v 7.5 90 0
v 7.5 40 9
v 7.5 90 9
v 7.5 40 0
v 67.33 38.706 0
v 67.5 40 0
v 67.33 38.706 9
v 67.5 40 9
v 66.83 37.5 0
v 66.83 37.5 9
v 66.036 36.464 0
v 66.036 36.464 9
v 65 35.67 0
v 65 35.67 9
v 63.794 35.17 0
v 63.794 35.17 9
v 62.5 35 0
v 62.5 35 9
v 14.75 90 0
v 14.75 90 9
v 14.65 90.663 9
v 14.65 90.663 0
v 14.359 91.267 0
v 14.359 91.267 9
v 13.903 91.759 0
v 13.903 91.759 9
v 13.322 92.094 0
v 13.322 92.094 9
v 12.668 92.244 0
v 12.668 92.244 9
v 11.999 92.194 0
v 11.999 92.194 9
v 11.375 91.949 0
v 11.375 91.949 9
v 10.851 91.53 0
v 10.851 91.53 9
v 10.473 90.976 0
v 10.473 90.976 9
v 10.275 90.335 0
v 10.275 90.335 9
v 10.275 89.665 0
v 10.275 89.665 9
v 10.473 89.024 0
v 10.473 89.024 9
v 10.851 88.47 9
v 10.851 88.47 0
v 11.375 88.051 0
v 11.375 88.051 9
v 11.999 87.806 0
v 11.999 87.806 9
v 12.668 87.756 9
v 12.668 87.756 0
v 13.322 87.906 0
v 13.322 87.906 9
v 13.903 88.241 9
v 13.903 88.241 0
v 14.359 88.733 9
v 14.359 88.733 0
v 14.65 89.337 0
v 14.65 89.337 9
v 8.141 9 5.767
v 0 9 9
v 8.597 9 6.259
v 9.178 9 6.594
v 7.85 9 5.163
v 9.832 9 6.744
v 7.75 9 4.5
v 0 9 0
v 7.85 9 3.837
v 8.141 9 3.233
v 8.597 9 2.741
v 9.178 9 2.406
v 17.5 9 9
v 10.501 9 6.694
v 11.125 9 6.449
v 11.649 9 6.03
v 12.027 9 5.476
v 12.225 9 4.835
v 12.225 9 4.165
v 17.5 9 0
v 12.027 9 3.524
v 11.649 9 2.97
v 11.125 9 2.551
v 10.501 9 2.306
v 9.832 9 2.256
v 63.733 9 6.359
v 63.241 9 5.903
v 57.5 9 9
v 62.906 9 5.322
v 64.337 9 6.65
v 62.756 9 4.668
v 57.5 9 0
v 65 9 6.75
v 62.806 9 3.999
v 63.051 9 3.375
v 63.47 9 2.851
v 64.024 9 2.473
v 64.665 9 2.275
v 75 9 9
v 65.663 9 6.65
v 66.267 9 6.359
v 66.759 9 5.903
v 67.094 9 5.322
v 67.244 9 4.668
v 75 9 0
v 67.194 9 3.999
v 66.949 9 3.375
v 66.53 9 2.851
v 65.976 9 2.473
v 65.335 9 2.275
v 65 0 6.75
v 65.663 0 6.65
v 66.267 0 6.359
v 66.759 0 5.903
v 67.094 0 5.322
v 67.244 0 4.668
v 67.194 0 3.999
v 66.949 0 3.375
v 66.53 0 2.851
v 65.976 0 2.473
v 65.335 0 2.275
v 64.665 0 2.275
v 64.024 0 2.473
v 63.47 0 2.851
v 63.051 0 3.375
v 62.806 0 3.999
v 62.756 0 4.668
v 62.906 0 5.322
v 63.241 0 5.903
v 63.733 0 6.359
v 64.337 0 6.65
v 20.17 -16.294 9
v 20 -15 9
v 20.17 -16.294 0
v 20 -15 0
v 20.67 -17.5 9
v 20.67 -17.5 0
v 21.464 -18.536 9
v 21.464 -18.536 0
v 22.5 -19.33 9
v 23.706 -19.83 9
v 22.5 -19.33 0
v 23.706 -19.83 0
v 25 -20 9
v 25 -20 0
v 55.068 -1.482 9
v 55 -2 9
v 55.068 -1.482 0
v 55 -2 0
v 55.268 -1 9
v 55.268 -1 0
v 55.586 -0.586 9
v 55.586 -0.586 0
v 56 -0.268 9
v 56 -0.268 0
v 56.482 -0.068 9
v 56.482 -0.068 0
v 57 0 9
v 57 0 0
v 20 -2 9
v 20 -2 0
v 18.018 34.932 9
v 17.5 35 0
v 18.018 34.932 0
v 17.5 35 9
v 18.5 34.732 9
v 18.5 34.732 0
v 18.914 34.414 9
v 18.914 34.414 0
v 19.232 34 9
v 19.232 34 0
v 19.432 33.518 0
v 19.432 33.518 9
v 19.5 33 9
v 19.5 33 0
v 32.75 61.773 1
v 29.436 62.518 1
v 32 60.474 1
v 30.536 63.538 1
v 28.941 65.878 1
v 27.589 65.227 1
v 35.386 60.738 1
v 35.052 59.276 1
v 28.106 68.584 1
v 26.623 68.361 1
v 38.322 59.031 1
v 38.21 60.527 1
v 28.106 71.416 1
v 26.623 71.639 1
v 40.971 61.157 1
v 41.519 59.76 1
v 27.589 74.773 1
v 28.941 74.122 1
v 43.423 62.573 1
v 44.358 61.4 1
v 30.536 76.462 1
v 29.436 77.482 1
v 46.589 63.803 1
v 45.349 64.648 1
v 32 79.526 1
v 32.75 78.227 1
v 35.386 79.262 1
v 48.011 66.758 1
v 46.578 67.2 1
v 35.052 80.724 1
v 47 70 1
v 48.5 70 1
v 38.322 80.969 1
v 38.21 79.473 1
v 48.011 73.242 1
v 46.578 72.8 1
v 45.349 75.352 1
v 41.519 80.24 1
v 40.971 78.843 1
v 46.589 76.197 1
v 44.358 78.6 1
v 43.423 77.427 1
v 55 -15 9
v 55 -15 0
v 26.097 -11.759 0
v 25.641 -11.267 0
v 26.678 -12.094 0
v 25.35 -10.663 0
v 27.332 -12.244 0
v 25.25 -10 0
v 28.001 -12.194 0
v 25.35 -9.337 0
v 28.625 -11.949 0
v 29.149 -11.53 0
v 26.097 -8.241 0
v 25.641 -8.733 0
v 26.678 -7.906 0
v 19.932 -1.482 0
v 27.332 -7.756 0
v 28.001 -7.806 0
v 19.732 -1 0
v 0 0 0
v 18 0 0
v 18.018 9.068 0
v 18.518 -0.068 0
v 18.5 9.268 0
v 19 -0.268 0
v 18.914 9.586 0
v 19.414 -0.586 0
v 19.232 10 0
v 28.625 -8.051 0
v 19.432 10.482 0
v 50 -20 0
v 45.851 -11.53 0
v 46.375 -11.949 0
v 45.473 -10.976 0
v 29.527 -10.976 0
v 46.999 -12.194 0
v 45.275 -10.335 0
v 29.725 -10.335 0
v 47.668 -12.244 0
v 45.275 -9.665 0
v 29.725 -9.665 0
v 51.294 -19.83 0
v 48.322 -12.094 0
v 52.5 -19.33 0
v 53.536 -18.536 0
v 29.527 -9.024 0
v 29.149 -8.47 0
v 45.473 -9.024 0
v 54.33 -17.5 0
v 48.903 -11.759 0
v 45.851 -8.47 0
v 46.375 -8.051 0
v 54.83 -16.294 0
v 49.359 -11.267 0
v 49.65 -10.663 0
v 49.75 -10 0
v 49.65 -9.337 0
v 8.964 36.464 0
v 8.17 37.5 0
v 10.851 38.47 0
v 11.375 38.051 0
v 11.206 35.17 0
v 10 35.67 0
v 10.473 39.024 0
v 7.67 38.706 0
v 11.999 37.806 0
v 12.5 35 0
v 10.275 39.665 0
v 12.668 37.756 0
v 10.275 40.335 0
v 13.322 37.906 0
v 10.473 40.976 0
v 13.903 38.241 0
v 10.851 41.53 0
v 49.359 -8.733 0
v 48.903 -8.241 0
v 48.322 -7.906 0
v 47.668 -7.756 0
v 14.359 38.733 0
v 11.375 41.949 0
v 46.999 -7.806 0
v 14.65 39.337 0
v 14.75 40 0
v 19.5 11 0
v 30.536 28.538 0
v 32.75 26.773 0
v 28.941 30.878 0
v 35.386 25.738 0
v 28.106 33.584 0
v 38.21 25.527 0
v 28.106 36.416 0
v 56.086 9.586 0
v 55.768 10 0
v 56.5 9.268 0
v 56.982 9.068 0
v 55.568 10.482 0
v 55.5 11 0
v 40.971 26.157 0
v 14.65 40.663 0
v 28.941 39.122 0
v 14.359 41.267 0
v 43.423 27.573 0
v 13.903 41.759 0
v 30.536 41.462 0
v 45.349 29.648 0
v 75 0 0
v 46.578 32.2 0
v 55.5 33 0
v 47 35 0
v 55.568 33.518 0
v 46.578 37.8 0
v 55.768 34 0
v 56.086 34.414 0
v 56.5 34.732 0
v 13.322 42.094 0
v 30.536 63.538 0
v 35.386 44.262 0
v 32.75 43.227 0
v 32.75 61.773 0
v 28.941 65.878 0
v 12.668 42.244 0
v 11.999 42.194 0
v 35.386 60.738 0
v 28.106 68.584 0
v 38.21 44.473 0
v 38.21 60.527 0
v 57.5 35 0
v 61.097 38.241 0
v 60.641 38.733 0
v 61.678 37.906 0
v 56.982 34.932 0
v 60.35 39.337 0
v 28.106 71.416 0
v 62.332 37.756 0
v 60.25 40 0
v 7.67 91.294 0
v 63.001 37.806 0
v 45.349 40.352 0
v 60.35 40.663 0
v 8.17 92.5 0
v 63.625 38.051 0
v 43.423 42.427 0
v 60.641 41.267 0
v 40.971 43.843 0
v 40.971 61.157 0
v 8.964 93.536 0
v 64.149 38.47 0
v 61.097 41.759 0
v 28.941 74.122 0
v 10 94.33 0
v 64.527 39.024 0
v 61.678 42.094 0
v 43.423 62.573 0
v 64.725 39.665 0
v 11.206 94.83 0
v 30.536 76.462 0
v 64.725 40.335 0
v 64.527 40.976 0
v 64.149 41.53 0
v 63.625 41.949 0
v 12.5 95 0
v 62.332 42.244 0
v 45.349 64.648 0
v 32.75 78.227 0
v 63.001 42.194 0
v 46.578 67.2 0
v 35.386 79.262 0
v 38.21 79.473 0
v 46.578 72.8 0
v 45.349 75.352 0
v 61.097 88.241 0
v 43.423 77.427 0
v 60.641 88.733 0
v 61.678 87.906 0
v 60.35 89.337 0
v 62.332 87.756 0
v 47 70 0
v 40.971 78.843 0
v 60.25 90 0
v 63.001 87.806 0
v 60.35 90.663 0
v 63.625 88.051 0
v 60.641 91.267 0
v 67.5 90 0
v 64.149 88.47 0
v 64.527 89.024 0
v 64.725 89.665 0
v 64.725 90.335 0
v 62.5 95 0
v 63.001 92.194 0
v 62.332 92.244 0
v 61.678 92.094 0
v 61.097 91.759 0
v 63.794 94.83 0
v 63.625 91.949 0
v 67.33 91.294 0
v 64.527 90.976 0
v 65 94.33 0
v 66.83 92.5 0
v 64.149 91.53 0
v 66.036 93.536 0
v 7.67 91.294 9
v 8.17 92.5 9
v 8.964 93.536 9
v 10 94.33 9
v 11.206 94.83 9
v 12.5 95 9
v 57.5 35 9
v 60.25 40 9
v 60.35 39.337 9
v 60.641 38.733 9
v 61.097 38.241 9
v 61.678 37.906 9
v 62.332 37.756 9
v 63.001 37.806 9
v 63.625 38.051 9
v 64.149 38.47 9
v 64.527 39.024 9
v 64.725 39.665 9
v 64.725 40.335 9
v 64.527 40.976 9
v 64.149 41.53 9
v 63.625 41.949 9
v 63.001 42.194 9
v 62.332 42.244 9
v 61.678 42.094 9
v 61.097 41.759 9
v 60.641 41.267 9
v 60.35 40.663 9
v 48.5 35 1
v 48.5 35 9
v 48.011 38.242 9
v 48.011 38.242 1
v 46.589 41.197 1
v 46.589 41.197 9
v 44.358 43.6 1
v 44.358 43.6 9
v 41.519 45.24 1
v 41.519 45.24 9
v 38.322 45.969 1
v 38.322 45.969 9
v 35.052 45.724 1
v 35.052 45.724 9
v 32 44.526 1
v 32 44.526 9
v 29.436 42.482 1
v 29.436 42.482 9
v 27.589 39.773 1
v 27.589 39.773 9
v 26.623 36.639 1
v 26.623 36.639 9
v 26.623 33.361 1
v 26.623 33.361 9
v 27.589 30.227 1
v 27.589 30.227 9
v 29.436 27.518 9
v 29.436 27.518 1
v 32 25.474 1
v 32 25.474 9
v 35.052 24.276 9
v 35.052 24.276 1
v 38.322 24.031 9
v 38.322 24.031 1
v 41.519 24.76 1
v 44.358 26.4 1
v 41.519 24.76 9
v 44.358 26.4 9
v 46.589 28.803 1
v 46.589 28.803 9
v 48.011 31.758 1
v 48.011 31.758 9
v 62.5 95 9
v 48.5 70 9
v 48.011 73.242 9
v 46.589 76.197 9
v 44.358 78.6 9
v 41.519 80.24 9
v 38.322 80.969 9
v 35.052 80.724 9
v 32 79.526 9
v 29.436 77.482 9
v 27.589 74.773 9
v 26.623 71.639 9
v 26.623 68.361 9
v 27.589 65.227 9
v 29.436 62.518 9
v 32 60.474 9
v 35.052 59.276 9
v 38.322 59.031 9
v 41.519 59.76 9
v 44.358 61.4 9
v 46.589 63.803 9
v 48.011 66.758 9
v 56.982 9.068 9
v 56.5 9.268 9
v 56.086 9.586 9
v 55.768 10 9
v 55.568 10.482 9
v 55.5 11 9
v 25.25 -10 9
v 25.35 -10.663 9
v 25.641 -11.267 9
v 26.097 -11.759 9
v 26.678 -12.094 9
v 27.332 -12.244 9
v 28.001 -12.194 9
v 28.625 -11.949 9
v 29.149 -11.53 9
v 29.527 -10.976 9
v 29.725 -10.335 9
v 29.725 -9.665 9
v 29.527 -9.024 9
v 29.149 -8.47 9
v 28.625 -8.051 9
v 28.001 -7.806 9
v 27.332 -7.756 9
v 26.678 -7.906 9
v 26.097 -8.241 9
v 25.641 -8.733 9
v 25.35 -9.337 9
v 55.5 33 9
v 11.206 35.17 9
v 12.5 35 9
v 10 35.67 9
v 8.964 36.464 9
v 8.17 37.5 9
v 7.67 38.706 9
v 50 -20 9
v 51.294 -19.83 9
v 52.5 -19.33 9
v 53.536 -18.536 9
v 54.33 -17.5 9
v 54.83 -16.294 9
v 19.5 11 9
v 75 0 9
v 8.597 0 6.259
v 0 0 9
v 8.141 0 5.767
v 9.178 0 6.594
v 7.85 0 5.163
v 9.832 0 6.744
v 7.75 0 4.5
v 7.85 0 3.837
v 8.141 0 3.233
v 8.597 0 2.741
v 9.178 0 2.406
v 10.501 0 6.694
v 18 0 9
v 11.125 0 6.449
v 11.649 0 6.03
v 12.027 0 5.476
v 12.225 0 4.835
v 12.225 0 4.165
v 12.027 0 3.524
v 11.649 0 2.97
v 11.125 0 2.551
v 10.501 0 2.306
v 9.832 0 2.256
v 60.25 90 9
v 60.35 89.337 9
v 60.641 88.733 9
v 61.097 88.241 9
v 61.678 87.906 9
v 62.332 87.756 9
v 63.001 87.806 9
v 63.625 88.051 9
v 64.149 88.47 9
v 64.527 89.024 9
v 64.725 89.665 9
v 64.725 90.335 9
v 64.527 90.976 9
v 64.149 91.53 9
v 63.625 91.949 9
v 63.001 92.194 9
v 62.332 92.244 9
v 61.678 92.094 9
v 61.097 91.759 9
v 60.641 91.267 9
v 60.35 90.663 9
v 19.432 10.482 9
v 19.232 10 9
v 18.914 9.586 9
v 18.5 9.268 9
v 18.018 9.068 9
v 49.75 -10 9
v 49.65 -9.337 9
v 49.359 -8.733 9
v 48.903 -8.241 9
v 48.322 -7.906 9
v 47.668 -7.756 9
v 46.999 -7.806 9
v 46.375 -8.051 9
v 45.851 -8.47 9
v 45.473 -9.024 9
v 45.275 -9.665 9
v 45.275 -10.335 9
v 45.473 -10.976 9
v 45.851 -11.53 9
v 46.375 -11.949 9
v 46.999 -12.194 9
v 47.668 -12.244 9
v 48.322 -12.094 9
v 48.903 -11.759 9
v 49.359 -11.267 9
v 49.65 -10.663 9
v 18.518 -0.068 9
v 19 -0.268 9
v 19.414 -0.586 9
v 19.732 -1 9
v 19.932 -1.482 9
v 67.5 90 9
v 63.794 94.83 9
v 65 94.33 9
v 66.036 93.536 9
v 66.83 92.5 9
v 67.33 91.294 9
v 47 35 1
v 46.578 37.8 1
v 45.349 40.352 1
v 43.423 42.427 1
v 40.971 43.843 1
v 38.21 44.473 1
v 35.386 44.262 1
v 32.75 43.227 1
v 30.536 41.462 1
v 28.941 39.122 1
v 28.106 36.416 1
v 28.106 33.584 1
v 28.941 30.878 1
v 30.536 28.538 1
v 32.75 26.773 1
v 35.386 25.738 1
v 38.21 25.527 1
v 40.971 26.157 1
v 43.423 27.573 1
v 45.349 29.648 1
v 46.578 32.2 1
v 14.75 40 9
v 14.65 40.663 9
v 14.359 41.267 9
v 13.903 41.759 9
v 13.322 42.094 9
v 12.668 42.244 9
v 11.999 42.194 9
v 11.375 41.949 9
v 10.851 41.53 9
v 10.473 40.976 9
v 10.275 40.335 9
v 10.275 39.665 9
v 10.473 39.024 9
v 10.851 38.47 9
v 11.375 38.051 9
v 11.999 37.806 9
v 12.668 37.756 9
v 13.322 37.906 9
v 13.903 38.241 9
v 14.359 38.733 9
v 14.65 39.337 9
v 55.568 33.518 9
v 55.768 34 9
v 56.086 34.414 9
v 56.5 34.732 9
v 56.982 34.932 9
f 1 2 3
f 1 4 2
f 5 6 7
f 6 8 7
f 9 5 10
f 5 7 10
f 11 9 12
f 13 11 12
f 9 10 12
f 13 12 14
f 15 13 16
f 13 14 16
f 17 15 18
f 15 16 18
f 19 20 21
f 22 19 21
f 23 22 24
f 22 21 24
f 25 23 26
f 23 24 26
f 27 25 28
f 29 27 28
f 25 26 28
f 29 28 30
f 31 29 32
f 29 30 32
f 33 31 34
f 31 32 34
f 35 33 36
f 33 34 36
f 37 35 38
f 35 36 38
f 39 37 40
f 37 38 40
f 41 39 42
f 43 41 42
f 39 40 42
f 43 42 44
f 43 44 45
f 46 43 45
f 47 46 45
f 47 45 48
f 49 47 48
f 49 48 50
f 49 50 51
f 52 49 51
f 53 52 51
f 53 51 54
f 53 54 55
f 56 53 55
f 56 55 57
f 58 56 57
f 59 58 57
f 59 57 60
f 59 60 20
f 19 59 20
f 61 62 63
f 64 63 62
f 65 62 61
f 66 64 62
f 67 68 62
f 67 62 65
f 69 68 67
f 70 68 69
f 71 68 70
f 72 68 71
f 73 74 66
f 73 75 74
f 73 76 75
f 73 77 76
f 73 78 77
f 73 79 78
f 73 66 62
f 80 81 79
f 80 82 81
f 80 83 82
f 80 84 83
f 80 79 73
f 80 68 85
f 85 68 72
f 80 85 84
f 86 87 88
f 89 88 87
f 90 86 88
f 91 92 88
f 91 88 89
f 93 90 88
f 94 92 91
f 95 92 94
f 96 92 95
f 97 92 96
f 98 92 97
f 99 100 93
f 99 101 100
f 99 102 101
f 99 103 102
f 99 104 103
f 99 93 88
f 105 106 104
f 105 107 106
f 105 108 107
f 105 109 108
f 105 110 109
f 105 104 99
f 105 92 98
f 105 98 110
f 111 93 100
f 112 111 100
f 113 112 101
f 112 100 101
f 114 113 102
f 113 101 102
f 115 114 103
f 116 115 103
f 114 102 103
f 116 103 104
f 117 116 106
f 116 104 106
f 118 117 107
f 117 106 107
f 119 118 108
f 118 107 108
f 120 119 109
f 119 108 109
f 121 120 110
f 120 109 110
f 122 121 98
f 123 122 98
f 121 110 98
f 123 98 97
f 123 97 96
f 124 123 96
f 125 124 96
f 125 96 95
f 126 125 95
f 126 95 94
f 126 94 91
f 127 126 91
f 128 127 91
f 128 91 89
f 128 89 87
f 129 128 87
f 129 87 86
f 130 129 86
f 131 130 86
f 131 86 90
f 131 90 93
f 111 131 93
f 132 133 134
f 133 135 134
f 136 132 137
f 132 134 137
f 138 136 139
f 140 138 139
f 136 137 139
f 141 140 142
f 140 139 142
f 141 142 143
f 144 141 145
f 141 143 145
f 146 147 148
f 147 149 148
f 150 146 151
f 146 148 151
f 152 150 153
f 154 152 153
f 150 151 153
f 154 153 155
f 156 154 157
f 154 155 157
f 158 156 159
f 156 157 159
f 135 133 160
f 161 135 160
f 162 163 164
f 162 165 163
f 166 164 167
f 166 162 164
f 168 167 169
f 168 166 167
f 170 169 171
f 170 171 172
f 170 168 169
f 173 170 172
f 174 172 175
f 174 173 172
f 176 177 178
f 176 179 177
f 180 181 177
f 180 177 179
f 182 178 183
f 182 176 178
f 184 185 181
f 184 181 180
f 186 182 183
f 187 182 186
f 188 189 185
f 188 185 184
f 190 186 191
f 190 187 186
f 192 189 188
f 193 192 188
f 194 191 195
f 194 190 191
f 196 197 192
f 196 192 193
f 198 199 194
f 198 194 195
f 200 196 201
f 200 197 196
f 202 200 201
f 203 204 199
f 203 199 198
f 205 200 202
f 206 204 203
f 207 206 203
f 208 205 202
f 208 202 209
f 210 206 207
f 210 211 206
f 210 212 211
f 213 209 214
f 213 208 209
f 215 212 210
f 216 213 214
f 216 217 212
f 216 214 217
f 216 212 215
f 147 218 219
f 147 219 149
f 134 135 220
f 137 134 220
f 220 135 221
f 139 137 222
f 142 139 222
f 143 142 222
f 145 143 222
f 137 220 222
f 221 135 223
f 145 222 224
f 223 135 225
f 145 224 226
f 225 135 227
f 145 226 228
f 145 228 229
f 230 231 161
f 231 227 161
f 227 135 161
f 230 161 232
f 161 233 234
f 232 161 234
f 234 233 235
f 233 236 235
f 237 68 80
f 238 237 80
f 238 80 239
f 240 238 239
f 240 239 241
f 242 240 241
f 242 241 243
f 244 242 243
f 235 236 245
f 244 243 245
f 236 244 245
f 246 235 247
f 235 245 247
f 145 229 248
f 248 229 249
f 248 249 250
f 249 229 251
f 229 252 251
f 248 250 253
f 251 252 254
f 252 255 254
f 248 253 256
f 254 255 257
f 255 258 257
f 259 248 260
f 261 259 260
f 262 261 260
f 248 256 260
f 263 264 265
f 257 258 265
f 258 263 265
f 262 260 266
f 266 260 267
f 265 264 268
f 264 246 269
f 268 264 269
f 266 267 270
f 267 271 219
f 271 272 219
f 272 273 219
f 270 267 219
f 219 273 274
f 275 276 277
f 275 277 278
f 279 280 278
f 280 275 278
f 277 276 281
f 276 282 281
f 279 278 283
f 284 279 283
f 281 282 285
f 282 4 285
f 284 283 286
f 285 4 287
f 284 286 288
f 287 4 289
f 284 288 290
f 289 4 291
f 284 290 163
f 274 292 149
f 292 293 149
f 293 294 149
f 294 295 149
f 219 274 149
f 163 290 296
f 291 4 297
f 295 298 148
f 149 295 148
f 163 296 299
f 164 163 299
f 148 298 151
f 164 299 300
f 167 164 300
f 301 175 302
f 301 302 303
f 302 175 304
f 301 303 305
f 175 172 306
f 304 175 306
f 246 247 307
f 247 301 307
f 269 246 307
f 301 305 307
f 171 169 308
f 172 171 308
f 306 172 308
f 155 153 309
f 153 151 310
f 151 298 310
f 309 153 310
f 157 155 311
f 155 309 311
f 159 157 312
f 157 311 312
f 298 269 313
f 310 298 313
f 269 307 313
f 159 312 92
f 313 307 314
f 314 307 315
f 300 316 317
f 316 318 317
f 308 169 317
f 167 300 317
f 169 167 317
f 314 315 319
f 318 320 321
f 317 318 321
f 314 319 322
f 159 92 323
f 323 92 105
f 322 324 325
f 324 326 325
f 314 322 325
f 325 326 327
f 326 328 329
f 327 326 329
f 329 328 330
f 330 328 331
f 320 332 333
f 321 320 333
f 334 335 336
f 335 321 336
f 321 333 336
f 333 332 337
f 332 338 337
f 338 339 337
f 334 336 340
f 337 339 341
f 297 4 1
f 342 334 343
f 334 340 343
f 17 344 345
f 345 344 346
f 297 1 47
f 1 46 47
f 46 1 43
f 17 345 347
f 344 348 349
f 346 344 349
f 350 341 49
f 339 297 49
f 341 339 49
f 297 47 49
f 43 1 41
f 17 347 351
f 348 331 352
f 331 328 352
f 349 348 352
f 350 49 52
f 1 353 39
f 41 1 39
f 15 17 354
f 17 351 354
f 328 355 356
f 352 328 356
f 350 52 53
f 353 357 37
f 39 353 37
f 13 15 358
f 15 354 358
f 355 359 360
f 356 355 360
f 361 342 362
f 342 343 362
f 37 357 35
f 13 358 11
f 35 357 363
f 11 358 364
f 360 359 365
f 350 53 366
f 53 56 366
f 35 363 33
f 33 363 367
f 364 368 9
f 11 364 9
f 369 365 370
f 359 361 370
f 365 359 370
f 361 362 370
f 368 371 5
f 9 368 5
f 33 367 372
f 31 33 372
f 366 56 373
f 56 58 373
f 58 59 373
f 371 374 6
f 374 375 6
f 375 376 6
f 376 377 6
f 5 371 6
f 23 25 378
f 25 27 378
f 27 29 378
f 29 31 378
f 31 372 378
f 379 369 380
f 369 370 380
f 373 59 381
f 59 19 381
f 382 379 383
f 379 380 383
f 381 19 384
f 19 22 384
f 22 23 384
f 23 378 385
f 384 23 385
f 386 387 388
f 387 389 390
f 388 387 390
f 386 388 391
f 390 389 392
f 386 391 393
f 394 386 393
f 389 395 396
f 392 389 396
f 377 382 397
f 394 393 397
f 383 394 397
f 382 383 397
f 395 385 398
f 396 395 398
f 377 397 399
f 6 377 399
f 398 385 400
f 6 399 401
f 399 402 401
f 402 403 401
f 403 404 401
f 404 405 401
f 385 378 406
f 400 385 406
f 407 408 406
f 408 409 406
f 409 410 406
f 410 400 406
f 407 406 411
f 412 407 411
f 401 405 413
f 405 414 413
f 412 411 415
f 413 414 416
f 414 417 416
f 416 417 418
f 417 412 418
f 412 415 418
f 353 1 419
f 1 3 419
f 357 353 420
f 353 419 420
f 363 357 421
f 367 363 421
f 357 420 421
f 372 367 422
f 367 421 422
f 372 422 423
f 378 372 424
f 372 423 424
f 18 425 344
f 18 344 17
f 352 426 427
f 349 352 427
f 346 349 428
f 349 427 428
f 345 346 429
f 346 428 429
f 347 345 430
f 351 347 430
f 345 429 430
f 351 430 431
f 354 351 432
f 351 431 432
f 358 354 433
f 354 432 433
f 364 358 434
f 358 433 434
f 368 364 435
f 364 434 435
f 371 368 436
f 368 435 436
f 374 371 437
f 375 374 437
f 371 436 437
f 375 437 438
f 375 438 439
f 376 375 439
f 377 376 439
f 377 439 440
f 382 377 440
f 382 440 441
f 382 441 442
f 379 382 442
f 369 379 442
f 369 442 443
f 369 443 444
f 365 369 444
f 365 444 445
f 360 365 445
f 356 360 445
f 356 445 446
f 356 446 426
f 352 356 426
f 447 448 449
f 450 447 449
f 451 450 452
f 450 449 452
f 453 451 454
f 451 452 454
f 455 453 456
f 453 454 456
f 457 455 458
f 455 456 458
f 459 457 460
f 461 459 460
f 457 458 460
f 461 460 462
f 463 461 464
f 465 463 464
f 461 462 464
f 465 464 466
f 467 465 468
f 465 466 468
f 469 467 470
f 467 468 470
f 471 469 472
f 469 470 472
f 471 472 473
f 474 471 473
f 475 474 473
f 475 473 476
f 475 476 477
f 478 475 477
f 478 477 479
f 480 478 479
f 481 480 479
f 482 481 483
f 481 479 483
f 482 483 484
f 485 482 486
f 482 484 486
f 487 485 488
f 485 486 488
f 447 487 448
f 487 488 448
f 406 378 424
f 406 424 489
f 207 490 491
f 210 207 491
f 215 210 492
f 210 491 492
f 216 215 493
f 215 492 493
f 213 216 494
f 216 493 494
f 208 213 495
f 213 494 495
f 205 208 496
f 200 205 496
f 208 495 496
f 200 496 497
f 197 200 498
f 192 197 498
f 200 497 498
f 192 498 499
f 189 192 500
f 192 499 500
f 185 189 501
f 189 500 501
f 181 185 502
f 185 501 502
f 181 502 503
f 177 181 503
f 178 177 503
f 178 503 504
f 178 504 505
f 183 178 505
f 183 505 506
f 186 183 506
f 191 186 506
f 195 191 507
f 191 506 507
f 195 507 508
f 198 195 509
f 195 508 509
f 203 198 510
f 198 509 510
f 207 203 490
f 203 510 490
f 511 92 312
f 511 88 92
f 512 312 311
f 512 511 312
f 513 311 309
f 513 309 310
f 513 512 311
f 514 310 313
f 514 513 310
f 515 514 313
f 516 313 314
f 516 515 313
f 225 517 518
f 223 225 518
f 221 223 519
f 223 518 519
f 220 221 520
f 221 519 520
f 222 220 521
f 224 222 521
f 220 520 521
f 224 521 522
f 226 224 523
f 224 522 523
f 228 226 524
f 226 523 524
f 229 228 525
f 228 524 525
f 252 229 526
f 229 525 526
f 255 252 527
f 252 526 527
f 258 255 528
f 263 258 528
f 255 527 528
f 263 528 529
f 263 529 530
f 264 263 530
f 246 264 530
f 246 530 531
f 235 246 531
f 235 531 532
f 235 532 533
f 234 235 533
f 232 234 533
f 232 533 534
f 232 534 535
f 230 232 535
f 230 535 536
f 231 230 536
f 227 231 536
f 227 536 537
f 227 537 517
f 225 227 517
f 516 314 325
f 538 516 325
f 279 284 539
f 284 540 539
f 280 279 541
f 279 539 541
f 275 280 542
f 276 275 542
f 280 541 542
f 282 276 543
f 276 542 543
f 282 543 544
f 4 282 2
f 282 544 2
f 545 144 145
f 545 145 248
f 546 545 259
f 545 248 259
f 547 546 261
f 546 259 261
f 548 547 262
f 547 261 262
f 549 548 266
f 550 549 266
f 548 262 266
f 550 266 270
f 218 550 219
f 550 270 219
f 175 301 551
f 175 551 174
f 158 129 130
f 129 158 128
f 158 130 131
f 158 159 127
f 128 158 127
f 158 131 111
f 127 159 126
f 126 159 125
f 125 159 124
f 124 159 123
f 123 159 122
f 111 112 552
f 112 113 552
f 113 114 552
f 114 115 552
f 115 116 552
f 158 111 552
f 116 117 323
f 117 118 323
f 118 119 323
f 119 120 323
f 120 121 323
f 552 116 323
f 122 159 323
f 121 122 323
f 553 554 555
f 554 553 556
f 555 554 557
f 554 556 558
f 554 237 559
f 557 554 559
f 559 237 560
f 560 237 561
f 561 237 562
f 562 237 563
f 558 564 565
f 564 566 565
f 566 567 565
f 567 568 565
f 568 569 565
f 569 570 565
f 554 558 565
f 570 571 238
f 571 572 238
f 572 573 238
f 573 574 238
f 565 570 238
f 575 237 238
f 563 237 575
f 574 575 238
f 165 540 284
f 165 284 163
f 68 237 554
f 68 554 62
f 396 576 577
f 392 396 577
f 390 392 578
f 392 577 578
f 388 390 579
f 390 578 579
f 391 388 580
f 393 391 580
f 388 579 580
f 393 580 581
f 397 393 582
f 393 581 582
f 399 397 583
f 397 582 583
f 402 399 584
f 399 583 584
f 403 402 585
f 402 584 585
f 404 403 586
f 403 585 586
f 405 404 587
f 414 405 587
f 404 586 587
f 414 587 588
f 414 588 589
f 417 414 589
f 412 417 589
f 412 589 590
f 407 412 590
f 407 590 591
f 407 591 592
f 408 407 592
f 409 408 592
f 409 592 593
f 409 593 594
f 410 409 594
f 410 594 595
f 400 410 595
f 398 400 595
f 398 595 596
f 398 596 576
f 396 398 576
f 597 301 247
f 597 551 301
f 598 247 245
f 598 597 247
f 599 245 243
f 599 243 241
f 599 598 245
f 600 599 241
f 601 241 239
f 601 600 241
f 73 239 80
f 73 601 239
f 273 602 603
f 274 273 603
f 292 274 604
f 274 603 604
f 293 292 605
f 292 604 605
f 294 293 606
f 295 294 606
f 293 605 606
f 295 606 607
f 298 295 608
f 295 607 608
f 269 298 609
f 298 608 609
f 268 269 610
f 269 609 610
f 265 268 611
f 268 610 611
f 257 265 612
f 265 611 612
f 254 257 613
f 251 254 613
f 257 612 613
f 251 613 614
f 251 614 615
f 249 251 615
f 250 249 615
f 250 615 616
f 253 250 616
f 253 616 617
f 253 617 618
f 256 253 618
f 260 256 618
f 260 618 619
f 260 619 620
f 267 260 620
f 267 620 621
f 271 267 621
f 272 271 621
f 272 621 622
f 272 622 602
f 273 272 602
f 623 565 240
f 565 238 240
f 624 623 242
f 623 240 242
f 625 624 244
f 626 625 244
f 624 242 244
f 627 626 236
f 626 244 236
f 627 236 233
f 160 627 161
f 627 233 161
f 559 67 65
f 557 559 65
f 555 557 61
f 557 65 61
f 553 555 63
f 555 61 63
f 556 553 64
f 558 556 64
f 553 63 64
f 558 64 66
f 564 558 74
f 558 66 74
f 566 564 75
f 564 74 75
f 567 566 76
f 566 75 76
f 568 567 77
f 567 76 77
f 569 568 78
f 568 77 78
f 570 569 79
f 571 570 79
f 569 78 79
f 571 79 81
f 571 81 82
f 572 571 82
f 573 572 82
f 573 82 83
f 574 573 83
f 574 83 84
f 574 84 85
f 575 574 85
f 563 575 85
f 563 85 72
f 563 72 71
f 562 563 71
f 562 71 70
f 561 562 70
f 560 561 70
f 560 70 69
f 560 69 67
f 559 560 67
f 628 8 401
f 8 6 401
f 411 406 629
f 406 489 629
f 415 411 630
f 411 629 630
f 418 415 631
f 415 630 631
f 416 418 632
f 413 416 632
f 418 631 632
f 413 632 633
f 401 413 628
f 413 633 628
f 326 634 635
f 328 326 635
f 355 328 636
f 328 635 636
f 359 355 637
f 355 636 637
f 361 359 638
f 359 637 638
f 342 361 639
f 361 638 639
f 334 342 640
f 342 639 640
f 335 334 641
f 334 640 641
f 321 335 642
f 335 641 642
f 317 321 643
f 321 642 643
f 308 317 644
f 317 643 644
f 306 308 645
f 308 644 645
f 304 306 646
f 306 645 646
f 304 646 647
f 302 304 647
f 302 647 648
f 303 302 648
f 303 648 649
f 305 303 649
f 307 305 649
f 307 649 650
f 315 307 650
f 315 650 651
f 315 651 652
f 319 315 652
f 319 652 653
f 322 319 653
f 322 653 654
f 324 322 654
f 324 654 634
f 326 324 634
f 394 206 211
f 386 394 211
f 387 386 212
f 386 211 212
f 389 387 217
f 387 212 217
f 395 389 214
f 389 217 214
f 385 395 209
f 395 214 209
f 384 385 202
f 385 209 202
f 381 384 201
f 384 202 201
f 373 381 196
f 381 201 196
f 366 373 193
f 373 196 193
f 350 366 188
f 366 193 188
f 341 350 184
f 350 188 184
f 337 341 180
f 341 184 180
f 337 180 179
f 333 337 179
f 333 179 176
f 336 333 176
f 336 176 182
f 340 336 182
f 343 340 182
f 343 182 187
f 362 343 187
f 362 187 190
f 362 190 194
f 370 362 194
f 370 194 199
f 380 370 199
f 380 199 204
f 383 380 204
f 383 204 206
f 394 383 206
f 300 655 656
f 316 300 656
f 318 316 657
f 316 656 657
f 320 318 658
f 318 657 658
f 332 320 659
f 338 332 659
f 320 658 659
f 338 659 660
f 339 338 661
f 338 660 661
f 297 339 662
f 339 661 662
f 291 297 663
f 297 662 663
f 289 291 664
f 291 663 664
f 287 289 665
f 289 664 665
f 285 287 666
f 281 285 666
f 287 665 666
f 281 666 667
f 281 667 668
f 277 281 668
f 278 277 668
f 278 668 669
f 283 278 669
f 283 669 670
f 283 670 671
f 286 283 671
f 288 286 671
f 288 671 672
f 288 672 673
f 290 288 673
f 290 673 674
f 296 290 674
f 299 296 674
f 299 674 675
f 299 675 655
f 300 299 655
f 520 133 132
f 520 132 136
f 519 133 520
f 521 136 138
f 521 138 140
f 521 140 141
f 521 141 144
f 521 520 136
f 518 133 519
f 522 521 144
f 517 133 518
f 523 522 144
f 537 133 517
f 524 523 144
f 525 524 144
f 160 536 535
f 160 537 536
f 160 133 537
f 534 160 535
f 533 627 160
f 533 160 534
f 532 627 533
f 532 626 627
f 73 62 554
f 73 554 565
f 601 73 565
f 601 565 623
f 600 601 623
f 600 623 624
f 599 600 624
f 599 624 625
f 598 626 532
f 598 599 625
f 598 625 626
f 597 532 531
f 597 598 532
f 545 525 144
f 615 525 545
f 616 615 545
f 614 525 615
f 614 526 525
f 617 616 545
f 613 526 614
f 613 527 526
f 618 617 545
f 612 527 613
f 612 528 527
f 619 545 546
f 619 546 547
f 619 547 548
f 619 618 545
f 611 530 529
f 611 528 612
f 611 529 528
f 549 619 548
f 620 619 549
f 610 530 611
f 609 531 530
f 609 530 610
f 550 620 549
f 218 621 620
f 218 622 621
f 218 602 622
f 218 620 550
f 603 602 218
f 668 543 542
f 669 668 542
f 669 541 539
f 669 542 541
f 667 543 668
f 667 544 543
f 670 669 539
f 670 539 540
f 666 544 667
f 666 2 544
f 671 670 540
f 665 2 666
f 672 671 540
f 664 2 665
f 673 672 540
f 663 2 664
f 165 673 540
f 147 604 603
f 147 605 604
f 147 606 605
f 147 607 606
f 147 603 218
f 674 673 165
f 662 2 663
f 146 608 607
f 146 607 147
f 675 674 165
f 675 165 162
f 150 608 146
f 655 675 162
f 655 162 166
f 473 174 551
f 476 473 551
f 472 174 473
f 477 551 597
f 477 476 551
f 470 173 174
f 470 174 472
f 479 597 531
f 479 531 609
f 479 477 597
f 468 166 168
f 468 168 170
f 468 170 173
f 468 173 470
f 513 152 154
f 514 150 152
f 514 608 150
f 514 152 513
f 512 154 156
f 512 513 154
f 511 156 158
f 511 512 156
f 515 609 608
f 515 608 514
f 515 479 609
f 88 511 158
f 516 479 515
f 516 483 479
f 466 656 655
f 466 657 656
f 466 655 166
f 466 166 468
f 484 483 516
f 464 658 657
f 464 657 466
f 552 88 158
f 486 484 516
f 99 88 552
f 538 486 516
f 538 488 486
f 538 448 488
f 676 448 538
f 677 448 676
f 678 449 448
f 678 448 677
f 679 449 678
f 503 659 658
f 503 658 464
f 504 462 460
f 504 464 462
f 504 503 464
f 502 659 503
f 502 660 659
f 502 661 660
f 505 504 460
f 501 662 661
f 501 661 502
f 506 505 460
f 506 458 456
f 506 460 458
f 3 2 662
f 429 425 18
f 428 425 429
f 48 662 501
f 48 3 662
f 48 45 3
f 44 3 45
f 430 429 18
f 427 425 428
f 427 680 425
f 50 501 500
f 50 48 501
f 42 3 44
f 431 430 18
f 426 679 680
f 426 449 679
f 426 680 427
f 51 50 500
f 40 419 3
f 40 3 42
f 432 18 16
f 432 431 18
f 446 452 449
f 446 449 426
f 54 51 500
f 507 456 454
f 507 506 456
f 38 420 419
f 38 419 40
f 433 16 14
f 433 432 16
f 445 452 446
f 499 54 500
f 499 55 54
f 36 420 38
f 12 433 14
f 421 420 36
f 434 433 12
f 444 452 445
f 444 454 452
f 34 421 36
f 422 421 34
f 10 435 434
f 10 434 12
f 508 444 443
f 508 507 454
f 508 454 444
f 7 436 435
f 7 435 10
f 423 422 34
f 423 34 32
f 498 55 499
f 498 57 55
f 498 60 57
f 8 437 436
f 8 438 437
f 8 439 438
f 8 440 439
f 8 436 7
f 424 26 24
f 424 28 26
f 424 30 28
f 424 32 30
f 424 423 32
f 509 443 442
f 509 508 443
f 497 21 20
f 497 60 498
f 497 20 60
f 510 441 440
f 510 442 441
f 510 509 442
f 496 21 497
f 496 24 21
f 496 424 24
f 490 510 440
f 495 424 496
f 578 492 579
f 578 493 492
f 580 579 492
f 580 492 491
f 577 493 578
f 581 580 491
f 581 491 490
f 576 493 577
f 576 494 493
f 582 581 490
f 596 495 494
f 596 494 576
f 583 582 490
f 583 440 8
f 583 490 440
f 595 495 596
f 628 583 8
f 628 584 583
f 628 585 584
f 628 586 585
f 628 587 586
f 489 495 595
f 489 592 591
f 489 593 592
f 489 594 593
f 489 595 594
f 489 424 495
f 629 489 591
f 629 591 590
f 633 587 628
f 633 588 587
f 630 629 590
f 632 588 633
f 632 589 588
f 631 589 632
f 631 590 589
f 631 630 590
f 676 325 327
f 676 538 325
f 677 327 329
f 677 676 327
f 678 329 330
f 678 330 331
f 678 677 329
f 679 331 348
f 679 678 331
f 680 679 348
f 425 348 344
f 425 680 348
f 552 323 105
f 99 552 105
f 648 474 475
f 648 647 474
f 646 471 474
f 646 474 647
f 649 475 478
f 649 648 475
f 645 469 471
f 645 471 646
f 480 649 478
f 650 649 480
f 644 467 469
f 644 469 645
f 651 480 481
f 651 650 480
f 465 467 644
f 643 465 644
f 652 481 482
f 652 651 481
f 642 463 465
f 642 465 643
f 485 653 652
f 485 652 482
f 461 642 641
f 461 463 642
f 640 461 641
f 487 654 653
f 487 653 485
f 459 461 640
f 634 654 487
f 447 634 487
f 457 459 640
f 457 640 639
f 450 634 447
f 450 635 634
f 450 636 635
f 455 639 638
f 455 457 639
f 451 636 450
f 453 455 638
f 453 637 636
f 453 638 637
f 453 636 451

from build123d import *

# Parameters (mm, degrees)
ESQUISSE1_W                  = 75
ESQUISSE1_H                  = 95
BOSS_EXTRU_1_DEPTH           = 9
ESQUISSE2_W                  = 35
ESQUISSE2_H                  = 20
BOSS_EXTRU_2_DEPTH           = 9
ESQUISSE3_R                  = 11
ENL_V_MAT_EXTRU_1_DEPTH      = 8
ESQUISSE4_R                  = 9.5
ENL_V_MAT_EXTRU_2_DEPTH      = 122.371331047
ENL_V_MAT_EXTRU_3_DEPTH      = 122.371331047
ENL_V_MAT_EXTRU_3_DEPTH_BACK = 122.371331047
ESQUISSE5_W                  = 7.5
ESQUISSE5_H                  = 86
ENL_V_START                  = -9
ESQUISSE8_W                  = 12
ESQUISSE8_H                  = 26
ENL_V_MAT_EXTRU_6_DEPTH      = 9
CONG_1_R                     = 2
CONG_2_R                     = 5
ESQUISSE6_R                  = 2.25
ENL_V_MAT_EXTRU_4_DEPTH      = 122.371331047
ESQUISSE7_R                  = 2.25
ENL_V_MAT_EXTRU_5_DEPTH      = 115.46396813


with BuildPart() as part:
    # Esquisse1 → Boss.-Extru.1 (new body)
    with BuildSketch(Plane.XY):
        with Locations((37.5, 47.5)):
            Rectangle(ESQUISSE1_W, ESQUISSE1_H)
    extrude(amount=BOSS_EXTRU_1_DEPTH)

    # Esquisse2 → Boss.-Extru.2 (add)
    with BuildSketch(Plane.XY.offset(9)):
        with Locations((37.5, -10)):
            Rectangle(ESQUISSE2_W, ESQUISSE2_H)
    extrude(amount=-BOSS_EXTRU_2_DEPTH)

    # Esquisse3 → Enlèv. mat.-Extru.1 (cut)
    with BuildSketch(Plane.XY.offset(9)):
        with Locations((37.5, 70)):
            Circle(ESQUISSE3_R)
        with Locations((37.5, 35)):
            Circle(ESQUISSE3_R)
    extrude(amount=-ENL_V_MAT_EXTRU_1_DEPTH, mode=Mode.SUBTRACT)

    # Esquisse4 → Enlèv. mat.-Extru.2 (cut, through all)
    with BuildSketch(Plane.XY.offset(9)):
        with Locations((37.5, 70)):
            Circle(ESQUISSE4_R)
        with Locations((37.5, 35)):
            Circle(ESQUISSE4_R)
    extrude(amount=-ENL_V_MAT_EXTRU_2_DEPTH, mode=Mode.SUBTRACT)

    # Esquisse5 → Enlèv. mat.-Extru.3 (cut, two sides: drawn at the far end of the back side and taken through both)
    with BuildSketch(Plane.XY.offset(9).offset(-ENL_V_MAT_EXTRU_3_DEPTH_BACK)):
        with Locations((71.25, 52)):
            Rectangle(ESQUISSE5_W, ESQUISSE5_H)
        with Locations((3.75, 52)):
            Rectangle(ESQUISSE5_W, ESQUISSE5_H)
    extrude(amount=ENL_V_MAT_EXTRU_3_DEPTH + ENL_V_MAT_EXTRU_3_DEPTH_BACK, mode=Mode.SUBTRACT)

    # Esquisse8 → Enlèv. mat.-Extru.6 (cut)
    with BuildSketch(Plane.XY.offset(9).offset(ENL_V_START)):
        with Locations((13.5, 22)):
            Rectangle(ESQUISSE8_W, ESQUISSE8_H)
        with Locations((61.5, 22)):
            Rectangle(ESQUISSE8_W, ESQUISSE8_H)
    extrude(amount=ENL_V_MAT_EXTRU_6_DEPTH, mode=Mode.SUBTRACT)

    # Congé1
    cong_1_edges = [part.edges().sort_by_distance(p)[0] for p in [
        (55.5, 9, 4.5),
        (55.5, 35, 4.5),
        (20, 0, 4.5),
        (55, 0, 4.5),
        (19.5, 35, 4.5),
        (19.5, 9, 4.5),
    ]]
    fillet(cong_1_edges, radius=CONG_1_R)

    # Congé2
    cong_2_edges = [part.edges().sort_by_distance(p)[0] for p in [
        (67.5, 35, 4.5),
        (20, -20, 4.5),
        (55, -20, 4.5),
        (67.5, 95, 4.5),
        (7.5, 95, 4.5),
        (7.5, 35, 4.5),
    ]]
    fillet(cong_2_edges, radius=CONG_2_R)

    # Esquisse6 → Enlèv. mat.-Extru.4 (cut, through all)
    with BuildSketch(Plane.XY.offset(9)):
        with Locations((47.5, -10)):
            Circle(ESQUISSE6_R)
        with Locations(Location((27.5, -10, 0), (0, 0, 180))):
            Circle(ESQUISSE6_R)
        with Locations((12.5, 90)):
            Circle(ESQUISSE6_R)
        with Locations((12.5, 40)):
            Circle(ESQUISSE6_R)
        with Locations(Location((62.5, 40, 0), (0, 0, 180))):
            Circle(ESQUISSE6_R)
        with Locations(Location((62.5, 90, 0), (0, 0, 180))):
            Circle(ESQUISSE6_R)
    extrude(amount=-ENL_V_MAT_EXTRU_4_DEPTH, mode=Mode.SUBTRACT)

    # Esquisse7 → Enlèv. mat.-Extru.5 (cut, through all)
    with BuildSketch(Plane(origin=(0, 9, 0), x_dir=(1, 0, 0), z_dir=(0, 1, 0))):
        with Locations(Location((10, -4.5, 0), (0, 0, 180))):
            Circle(ESQUISSE7_R)
        with Locations(Location((65, -4.5, 0), (0, 0, 270))):
            Circle(ESQUISSE7_R)
    extrude(amount=-ENL_V_MAT_EXTRU_5_DEPTH, mode=Mode.SUBTRACT)


solid = part.part
